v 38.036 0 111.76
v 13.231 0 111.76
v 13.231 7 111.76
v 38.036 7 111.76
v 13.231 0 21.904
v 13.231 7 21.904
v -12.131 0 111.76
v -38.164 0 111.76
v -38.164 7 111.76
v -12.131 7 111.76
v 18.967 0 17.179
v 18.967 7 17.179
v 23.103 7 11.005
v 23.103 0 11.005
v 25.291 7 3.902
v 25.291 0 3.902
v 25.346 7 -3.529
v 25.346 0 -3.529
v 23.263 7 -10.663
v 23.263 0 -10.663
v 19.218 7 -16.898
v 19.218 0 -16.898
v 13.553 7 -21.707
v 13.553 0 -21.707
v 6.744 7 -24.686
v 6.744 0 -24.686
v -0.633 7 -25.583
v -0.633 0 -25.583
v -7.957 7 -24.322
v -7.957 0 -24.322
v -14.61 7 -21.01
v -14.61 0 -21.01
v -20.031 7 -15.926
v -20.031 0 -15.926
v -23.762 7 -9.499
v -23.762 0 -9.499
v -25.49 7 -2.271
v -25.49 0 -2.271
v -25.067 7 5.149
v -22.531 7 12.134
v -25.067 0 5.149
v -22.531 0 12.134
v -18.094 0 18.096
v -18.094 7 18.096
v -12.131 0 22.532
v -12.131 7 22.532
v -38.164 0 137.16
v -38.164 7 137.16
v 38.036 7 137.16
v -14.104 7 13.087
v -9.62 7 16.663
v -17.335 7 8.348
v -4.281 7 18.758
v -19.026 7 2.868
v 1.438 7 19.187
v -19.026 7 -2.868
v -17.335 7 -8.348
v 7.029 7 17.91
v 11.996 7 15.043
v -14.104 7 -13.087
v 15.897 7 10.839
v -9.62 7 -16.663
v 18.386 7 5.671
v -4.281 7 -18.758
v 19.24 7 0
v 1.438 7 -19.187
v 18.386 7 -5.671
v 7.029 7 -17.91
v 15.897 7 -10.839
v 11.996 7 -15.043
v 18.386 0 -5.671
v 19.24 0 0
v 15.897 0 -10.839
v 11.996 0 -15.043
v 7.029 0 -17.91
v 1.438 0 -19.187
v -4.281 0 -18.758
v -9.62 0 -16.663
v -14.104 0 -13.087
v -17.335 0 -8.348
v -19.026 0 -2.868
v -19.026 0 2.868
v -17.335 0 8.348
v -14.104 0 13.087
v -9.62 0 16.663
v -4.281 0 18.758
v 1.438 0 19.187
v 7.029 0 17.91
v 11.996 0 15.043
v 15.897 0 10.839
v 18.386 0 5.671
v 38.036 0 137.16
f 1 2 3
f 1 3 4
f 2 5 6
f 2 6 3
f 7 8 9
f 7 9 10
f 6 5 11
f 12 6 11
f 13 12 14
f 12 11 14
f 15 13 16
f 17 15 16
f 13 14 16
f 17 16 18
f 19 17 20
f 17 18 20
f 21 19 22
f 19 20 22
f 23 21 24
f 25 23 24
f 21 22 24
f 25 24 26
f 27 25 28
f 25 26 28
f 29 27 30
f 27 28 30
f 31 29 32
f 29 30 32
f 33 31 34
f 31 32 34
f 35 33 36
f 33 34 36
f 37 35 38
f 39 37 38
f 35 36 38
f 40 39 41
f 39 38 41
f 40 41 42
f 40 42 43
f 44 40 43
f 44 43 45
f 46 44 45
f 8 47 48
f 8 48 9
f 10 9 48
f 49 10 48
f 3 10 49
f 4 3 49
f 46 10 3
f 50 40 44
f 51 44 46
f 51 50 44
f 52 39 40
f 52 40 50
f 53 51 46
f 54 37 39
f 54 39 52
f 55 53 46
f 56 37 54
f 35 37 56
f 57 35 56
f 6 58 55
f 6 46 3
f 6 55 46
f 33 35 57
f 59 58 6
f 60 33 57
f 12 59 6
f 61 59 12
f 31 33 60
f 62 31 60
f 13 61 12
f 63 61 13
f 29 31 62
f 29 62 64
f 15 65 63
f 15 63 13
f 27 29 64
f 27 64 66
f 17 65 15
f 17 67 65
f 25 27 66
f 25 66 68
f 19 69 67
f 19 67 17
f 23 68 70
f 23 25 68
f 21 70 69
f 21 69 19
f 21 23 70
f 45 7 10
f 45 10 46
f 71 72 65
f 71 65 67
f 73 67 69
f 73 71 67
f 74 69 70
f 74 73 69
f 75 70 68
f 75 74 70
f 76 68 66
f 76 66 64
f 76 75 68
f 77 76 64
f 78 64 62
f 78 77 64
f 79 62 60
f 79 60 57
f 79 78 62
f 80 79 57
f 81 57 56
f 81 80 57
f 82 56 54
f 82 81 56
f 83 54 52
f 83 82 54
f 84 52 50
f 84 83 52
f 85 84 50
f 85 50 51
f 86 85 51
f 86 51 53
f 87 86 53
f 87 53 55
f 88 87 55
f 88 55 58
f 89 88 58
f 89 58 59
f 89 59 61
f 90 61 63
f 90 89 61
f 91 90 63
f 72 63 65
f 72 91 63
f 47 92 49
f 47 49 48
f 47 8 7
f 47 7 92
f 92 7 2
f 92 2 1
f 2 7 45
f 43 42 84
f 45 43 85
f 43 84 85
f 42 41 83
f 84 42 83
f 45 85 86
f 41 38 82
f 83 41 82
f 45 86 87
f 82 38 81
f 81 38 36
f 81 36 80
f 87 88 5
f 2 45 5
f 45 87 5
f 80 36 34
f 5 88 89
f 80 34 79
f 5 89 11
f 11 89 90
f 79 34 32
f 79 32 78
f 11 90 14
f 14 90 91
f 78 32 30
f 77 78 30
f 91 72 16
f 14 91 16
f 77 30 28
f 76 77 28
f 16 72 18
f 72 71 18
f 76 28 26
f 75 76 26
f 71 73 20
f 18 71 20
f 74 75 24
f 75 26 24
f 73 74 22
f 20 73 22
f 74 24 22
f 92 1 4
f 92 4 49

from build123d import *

# Parameters (mm, degrees)
SKETCH1_R           = 25.5905
SKETCH1_R_2         = 19.2405
BOSS_EXTRUDE1_DEPTH = 7


with BuildPart() as part:
    # Sketch1 → Boss-Extrude1 (new body)
    with BuildSketch(Plane(origin=(0, 0, 0), x_dir=(1, 0, 0), z_dir=(0, 1, 0))):
        Circle(SKETCH1_R)
        Circle(SKETCH1_R_2, mode=Mode.SUBTRACT)
        Polygon((-12.131390351, -20.018099484), (13.231279228, -20.018099484), (13.231279228, -111.76), (38.036054145, -111.76), (38.036054145, -137.16), (-38.163945855, -137.16), (-38.163945855, -111.76), (-12.131390351, -111.76), align=None)
    extrude(amount=BOSS_EXTRUDE1_DEPTH)


solid = part.part
